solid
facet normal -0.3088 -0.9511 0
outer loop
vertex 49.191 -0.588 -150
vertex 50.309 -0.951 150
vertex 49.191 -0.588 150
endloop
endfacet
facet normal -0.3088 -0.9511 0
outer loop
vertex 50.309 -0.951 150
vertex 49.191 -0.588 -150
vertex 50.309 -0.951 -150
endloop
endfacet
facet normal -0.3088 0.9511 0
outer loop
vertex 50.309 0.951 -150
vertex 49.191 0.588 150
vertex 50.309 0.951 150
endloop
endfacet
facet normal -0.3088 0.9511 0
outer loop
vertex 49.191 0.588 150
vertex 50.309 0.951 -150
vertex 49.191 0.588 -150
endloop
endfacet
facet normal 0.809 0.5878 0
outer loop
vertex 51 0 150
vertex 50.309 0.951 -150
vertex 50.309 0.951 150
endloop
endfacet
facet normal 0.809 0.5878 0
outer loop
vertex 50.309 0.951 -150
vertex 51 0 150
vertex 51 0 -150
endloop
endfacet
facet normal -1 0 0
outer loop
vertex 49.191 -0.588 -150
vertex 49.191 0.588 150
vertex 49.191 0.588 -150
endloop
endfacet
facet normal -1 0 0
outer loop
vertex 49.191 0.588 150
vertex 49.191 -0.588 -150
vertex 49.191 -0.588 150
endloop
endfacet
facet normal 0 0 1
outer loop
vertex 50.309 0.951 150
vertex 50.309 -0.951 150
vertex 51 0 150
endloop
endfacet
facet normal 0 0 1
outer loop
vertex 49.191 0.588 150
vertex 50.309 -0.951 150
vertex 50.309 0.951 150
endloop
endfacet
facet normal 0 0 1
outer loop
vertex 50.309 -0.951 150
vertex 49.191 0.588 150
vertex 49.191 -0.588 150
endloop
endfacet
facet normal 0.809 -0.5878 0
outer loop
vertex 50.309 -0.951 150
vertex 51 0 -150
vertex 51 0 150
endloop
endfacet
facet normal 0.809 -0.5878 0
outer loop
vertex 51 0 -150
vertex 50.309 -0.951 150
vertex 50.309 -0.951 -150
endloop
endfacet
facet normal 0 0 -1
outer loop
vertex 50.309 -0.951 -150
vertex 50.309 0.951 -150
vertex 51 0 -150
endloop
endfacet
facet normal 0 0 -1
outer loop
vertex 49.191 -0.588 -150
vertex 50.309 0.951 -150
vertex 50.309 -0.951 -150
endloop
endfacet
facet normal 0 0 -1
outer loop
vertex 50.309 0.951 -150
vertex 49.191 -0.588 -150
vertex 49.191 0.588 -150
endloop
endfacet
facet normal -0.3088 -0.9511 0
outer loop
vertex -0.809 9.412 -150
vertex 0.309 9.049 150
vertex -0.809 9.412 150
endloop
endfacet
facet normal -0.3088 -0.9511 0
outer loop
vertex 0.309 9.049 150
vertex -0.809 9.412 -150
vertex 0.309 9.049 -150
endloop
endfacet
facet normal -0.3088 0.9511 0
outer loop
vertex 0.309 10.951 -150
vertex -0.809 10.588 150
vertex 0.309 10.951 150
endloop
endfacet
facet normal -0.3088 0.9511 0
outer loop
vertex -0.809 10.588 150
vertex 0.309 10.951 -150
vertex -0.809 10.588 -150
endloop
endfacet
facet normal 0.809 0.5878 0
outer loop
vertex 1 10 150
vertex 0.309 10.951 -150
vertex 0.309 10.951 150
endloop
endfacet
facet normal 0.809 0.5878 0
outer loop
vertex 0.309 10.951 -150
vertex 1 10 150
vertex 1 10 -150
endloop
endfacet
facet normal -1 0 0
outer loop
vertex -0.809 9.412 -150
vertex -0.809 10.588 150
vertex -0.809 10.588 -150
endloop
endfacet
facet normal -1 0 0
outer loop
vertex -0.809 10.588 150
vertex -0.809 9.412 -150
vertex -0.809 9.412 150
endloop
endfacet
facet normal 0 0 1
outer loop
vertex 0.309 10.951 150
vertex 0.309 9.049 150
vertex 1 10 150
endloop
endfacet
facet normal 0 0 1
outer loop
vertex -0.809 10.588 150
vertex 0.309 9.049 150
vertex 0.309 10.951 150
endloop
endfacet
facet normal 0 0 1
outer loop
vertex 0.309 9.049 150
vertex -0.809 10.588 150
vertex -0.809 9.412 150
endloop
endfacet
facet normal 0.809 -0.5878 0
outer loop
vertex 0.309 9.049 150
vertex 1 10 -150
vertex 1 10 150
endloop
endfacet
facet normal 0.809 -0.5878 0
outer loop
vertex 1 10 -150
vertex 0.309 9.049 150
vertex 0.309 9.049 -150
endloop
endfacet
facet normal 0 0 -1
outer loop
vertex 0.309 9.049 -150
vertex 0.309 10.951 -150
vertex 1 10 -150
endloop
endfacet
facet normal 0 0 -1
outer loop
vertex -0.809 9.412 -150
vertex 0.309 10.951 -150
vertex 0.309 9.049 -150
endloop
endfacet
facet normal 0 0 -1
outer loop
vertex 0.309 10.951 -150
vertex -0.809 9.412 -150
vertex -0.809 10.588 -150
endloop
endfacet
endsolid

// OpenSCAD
// This indicates the offset-plane
// joint-primitive constraint. 
// 
// First the parallel constraint is met.
// The constraint is the difference 
// (offset) between two planes passing 
// through the parallel lines.

// parameters

// renders

color("red", 0.25){
translate([50,0,0]){
  rotate([0,0,0])
    cylinder(300, 1,1, true);
  rotate([0,90,0])
    square([300,300], true);
}}

color("green", 0.25){
translate([0,10,0]){
  rotate([0,0,0])
    cylinder(300, 1,1, true);
  rotate([0,90,25])
    square([300,300], true);
}}

// modules
